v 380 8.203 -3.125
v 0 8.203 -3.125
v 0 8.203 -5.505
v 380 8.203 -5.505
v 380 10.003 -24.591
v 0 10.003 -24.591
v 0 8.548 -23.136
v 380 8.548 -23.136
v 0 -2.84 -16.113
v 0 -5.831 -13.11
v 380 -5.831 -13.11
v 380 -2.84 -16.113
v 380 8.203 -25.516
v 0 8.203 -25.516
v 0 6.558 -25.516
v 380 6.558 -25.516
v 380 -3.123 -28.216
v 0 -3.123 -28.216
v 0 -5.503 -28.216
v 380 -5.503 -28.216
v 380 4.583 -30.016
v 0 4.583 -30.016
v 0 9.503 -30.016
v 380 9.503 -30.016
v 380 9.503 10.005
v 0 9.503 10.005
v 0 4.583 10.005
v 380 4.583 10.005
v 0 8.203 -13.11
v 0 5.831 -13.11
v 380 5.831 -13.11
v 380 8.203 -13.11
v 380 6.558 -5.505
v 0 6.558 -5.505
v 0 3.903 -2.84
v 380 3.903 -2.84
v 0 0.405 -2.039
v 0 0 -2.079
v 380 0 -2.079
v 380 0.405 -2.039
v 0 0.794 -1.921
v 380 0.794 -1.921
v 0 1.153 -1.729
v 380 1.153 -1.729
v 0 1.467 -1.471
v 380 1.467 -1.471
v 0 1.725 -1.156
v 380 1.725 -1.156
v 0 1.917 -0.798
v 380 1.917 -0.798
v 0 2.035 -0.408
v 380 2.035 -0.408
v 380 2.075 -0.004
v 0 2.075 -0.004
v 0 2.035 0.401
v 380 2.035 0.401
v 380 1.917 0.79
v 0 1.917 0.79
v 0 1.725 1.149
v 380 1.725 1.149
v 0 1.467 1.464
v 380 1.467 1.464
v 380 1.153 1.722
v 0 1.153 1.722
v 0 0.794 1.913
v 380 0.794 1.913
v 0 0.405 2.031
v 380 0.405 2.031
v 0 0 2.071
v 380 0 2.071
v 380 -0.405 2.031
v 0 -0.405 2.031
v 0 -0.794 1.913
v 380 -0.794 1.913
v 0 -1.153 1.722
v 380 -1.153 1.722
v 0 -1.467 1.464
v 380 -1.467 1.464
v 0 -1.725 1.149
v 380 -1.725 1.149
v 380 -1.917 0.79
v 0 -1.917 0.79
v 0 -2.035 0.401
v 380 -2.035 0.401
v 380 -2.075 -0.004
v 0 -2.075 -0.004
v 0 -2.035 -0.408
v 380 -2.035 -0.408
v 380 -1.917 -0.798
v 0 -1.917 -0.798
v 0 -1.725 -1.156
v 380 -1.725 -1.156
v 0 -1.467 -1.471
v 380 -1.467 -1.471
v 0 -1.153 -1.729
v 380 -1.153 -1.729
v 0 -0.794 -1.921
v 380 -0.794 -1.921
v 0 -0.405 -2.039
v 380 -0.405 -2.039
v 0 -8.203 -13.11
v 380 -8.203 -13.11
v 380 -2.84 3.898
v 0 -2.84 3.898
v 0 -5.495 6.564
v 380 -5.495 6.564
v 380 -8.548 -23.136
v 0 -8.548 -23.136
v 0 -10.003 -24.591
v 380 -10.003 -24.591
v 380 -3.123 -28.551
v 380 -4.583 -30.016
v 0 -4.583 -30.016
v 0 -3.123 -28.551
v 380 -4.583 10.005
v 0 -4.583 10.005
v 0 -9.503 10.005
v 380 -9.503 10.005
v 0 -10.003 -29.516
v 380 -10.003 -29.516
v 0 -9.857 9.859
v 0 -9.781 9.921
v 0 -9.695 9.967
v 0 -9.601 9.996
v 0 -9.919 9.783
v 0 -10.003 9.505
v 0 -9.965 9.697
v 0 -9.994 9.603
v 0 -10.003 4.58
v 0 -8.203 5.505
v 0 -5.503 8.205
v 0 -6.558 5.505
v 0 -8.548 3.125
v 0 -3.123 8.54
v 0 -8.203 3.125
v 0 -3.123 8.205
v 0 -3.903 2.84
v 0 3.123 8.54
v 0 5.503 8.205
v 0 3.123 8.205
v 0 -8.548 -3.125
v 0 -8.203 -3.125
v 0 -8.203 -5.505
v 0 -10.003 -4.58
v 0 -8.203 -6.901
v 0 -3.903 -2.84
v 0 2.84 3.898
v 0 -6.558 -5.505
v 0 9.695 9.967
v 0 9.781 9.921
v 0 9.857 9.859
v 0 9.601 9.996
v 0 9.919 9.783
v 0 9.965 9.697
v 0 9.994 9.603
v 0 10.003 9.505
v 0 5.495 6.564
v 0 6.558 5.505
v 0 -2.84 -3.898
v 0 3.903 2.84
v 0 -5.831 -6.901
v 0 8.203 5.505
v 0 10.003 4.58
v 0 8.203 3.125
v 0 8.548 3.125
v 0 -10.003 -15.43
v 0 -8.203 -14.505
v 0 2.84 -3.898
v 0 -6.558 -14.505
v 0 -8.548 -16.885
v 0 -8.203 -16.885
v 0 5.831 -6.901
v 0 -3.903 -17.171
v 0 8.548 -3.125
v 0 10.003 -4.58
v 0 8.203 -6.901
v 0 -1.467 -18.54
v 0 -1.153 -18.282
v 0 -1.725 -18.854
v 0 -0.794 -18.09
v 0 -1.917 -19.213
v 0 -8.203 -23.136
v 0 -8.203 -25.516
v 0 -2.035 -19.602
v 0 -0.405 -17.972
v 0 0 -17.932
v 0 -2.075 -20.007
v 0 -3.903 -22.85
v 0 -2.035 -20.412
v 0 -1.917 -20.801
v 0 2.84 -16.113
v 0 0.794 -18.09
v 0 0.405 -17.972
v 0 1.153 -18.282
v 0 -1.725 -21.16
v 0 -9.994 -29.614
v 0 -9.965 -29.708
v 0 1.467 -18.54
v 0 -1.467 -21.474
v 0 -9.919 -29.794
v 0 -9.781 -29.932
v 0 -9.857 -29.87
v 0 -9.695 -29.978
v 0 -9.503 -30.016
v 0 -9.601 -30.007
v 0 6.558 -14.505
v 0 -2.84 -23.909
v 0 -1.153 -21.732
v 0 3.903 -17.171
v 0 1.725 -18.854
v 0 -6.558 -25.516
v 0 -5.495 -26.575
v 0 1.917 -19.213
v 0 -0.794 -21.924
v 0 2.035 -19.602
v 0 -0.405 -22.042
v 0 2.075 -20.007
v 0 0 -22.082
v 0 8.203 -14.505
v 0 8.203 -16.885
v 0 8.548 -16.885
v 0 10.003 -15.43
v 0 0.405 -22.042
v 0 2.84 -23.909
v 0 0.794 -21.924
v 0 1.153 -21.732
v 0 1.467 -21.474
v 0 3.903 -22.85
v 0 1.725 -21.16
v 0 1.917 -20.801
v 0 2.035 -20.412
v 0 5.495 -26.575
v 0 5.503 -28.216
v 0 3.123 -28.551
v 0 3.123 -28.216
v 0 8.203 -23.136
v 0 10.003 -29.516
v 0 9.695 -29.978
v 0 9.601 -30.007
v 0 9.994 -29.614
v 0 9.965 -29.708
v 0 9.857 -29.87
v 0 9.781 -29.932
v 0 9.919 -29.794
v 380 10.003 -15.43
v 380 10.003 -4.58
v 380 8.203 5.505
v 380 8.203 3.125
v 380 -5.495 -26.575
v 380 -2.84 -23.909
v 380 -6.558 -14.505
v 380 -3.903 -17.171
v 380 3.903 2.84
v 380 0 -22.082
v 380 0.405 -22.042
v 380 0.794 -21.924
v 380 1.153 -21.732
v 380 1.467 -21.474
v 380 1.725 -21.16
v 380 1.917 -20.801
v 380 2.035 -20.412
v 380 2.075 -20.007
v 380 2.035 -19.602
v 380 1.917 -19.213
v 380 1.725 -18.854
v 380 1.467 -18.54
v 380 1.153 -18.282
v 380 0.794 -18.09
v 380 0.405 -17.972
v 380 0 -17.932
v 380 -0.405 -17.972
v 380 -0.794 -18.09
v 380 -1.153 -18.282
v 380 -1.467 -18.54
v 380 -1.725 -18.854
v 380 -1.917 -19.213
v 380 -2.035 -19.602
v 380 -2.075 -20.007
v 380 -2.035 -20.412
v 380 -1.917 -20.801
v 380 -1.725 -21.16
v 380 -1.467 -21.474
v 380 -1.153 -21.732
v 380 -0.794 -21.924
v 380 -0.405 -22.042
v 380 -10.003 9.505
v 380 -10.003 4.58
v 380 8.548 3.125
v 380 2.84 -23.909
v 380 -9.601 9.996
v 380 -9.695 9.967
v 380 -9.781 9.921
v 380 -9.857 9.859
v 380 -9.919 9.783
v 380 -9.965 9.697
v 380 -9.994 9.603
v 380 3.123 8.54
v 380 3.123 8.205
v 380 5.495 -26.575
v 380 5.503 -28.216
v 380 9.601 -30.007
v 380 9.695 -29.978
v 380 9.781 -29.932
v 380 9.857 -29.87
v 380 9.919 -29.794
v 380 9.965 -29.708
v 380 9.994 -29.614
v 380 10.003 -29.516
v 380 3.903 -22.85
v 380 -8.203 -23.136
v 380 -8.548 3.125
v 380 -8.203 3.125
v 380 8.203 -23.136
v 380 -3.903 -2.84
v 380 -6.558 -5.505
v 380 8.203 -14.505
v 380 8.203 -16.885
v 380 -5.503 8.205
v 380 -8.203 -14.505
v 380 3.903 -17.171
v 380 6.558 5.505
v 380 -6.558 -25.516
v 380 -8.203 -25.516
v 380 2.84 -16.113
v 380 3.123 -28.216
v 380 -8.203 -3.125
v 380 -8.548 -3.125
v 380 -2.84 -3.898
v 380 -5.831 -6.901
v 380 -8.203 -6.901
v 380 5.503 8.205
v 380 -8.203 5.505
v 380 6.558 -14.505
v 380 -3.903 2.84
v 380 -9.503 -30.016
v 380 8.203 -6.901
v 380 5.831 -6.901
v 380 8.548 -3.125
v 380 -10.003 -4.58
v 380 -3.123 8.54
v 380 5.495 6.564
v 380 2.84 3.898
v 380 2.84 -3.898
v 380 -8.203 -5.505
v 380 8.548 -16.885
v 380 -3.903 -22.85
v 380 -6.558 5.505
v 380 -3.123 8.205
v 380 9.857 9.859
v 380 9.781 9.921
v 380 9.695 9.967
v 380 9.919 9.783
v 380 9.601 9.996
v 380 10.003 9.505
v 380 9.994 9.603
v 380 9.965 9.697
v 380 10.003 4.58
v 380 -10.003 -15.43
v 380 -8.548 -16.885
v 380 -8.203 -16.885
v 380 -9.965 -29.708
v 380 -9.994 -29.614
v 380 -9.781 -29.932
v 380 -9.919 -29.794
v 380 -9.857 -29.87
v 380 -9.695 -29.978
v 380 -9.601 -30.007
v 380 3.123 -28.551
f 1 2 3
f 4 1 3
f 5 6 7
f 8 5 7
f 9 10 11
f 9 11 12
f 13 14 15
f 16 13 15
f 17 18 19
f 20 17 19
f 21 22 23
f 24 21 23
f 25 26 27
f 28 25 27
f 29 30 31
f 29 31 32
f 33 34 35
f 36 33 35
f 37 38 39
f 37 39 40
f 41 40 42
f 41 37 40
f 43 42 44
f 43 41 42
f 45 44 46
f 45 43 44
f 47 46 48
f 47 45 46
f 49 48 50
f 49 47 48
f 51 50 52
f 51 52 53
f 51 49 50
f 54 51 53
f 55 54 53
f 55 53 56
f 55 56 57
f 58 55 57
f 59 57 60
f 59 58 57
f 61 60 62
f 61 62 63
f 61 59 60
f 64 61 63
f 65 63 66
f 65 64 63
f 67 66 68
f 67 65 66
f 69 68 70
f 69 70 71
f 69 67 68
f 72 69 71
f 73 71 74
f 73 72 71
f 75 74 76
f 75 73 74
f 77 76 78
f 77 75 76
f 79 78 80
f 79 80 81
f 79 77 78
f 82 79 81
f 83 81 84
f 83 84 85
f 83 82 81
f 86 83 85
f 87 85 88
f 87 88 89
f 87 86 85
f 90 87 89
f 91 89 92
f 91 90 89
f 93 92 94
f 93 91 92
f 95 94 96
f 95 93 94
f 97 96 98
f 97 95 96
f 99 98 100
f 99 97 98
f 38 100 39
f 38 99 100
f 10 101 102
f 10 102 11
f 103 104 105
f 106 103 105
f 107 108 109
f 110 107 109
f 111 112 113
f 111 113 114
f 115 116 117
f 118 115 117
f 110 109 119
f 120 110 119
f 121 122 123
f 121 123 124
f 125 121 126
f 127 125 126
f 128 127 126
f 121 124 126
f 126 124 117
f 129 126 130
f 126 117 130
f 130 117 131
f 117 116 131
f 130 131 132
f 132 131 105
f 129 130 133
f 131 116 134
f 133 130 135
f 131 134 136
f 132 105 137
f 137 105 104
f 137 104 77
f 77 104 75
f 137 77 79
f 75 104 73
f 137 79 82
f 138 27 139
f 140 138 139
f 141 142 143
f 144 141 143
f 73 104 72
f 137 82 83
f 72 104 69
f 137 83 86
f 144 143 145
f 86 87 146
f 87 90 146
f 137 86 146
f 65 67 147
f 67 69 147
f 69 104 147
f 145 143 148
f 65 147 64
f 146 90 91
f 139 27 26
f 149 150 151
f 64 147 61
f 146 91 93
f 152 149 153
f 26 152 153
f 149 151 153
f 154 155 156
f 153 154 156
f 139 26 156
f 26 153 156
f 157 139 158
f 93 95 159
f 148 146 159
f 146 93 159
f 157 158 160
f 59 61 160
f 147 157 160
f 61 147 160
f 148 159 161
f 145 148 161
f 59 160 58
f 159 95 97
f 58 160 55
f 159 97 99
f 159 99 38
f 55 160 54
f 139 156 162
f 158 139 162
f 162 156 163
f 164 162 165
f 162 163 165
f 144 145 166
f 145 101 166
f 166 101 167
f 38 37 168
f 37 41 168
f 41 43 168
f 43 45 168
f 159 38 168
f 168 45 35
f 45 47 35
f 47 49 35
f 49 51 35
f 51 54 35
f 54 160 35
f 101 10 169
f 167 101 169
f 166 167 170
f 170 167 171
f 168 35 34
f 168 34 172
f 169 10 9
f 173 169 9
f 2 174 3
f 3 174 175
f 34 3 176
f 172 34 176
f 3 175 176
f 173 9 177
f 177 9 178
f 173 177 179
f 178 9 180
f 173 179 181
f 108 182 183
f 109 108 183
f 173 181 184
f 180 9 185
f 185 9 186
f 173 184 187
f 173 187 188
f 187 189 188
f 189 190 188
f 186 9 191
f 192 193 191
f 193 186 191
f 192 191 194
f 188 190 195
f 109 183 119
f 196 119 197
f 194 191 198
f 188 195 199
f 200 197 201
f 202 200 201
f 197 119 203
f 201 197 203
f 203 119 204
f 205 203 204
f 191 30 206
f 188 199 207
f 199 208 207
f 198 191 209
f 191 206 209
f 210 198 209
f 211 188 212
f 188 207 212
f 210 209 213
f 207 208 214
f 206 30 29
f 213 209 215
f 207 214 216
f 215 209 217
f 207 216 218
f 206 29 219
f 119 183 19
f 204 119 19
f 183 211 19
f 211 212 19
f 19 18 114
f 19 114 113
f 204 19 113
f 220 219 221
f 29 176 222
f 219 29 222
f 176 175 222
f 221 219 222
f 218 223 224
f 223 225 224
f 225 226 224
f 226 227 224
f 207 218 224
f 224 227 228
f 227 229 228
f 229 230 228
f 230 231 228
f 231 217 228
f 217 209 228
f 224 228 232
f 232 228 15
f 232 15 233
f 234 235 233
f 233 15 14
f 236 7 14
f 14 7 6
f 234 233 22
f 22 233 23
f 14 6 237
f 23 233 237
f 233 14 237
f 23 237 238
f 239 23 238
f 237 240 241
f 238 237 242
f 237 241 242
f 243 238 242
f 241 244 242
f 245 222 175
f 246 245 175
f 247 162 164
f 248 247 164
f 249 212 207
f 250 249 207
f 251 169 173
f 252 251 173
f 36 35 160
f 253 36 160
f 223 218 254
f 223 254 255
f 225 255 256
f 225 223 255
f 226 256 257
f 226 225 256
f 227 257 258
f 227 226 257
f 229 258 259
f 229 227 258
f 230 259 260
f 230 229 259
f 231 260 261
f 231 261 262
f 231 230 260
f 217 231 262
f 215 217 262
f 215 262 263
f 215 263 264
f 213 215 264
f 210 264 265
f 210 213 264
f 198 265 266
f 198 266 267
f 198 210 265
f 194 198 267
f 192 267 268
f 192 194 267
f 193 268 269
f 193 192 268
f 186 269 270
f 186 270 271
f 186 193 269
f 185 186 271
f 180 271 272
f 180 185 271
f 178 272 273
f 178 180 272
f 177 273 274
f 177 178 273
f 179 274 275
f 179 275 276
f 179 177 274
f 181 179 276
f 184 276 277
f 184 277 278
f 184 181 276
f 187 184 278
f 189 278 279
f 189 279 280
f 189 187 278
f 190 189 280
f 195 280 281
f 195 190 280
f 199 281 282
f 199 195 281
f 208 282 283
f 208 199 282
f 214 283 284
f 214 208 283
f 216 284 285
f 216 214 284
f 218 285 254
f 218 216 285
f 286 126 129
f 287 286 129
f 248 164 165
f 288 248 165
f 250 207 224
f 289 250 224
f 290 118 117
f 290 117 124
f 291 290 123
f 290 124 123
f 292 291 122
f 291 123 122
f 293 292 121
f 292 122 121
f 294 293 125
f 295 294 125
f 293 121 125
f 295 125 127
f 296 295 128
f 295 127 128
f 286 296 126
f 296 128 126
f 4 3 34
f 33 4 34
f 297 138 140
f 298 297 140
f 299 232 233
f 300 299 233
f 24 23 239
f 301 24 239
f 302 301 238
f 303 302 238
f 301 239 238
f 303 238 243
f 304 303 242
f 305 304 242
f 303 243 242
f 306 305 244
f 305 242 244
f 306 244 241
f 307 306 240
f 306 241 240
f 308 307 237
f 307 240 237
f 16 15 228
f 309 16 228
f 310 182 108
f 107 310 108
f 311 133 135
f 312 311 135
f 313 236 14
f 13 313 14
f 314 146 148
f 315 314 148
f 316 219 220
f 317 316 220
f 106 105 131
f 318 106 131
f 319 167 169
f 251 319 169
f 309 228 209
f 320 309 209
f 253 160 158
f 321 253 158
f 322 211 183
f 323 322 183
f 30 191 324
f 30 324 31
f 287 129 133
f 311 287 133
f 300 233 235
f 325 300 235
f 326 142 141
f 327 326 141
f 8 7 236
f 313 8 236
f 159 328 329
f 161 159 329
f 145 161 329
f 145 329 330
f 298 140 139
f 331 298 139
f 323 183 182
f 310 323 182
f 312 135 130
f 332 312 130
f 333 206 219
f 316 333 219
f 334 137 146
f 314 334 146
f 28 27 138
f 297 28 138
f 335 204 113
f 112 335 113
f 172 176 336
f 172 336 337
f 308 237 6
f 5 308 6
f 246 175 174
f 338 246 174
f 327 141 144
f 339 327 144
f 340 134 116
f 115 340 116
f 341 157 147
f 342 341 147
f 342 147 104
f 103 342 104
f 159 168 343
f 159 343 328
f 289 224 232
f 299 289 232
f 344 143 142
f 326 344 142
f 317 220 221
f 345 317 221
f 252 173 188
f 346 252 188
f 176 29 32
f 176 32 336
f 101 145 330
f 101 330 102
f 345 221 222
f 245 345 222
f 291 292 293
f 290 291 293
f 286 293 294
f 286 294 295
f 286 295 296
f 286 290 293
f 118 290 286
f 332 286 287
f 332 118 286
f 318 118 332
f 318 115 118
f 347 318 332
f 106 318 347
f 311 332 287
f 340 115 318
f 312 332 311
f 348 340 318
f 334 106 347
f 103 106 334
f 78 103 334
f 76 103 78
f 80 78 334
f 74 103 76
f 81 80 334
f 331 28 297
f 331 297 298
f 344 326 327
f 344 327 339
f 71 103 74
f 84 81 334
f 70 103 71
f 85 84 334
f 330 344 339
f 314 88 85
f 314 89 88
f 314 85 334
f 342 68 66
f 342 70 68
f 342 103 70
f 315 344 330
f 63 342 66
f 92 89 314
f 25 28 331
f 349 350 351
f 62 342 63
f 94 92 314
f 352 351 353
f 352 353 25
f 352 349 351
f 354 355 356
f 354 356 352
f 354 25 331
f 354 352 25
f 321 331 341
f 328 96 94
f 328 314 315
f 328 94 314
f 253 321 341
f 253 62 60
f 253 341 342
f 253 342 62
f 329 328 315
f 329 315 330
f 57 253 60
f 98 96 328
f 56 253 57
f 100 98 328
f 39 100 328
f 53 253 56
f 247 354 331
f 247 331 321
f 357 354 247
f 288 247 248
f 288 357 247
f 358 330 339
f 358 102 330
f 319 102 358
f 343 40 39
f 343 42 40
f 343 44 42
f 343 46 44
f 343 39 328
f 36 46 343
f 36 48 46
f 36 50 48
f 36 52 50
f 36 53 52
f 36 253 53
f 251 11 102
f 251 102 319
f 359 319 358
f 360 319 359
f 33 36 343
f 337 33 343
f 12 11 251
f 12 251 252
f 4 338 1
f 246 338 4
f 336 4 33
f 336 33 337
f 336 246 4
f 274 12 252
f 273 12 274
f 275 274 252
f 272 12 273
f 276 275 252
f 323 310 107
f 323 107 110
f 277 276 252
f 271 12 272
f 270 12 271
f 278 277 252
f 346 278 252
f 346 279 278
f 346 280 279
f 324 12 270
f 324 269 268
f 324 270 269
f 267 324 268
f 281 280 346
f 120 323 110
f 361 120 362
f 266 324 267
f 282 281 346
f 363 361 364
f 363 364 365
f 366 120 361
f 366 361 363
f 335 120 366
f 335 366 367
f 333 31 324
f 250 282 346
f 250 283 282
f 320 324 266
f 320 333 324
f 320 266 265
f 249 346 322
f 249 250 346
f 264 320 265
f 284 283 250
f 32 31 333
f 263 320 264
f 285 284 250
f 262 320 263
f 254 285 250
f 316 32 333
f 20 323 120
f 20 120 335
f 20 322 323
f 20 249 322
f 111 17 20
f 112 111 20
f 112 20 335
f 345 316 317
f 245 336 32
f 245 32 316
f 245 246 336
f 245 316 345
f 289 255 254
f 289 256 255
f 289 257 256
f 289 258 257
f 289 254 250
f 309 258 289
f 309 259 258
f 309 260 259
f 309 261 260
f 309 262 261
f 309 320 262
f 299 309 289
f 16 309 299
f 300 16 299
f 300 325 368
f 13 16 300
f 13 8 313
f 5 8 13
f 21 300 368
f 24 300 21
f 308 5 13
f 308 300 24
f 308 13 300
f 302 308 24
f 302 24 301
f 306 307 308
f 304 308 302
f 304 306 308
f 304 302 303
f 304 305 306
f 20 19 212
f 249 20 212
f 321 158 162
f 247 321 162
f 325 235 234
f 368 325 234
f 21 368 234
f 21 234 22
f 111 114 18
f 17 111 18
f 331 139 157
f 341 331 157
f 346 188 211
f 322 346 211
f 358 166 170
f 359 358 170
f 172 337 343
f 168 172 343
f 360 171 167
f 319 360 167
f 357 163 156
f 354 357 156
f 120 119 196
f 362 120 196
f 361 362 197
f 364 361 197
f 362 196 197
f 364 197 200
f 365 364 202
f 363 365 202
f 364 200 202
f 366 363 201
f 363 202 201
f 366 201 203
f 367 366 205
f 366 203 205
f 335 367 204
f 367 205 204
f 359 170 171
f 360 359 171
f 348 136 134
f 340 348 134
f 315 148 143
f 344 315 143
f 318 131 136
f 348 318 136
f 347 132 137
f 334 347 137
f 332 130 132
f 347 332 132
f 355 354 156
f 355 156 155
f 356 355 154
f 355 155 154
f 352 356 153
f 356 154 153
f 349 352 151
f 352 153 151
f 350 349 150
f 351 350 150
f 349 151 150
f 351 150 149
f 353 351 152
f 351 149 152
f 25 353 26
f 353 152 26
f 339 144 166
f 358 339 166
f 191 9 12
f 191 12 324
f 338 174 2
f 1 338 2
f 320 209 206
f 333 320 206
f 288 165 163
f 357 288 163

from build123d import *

# Parameters (mm, degrees)
SKETCH2_R           = 2.075
BOSS_EXTRUDE1_DEPTH = 380


with BuildPart() as part:
    # Sketch2 → Boss-Extrude1 (new body)
    with BuildSketch(Plane(origin=(0, 0, 0), x_dir=(0, 0, -1), z_dir=(1, 0, 0))):
        with BuildLine():
            Line((3.125428693, 8.548200862), (3.125428693, 8.203200862))
            Line((3.125428693, 8.203200862), (5.505428693, 8.203200862))
            Line((5.505428693, 8.203200862), (5.505428693, 6.558200862))
            Line((5.505428693, 6.558200862), (2.839571307, 3.903200862))
            Line((2.839571307, 3.903200862), (-2.839571307, 3.903200862))
            Line((-2.839571307, 3.903200862), (-5.505428693, 6.558200862))
            Line((-5.505428693, 6.558200862), (-5.505428693, 8.203200862))
            Line((-5.505428693, 8.203200862), (-3.125428693, 8.203200862))
            Line((-3.125428693, 8.203200862), (-3.125428693, 8.548200862))
            Line((-3.125428693, 8.548200862), (-4.580428693, 10.003200862))
            Line((-4.580428693, 10.003200862), (-9.505428693, 10.003200862))
            ThreePointArc((-9.505428693, 10.003200862), (-9.858982084, 9.856754253), (-10.005428693, 9.503200862))
            Line((-10.005428693, 9.503200862), (-10.005428693, 4.583200862))
            Line((-10.005428693, 4.583200862), (-8.53985696, 3.123200862))
            Line((-8.53985696, 3.123200862), (-8.205428693, 3.123200862))
            Line((-8.205428693, 3.123200862), (-8.205428693, 5.503200862))
            Line((-8.205428693, 5.503200862), (-6.563922349, 5.49537859))
            Line((-6.563922349, 5.49537859), (-3.898064962, 2.84037859))
            Line((-3.898064962, 2.84037859), (-3.898064962, -2.84037859))
            Line((-3.898064962, -2.84037859), (-6.563922349, -5.49537859))
            Line((-6.563922349, -5.49537859), (-8.205428693, -5.503200862))
            Line((-8.205428693, -5.503200862), (-8.205428693, -3.123200862))
            Line((-8.205428693, -3.123200862), (-8.53985696, -3.123200862))
            Line((-8.53985696, -3.123200862), (-10.005428693, -4.583200862))
            Line((-10.005428693, -4.583200862), (-10.005428693, -9.503200862))
            ThreePointArc((-10.005428693, -9.503200862), (-9.858982084, -9.856754253), (-9.505428693, -10.003200862))
            Line((-9.505428693, -10.003200862), (-4.580428693, -10.003200862))
            Line((-4.580428693, -10.003200862), (-3.125428693, -8.548200862))
            Line((-3.125428693, -8.548200862), (-3.125428693, -8.203200862))
            Line((-3.125428693, -8.203200862), (-5.505428693, -8.203200862))
            Line((-5.505428693, -8.203200862), (-5.505428693, -6.558200862))
            Line((-5.505428693, -6.558200862), (-2.839571307, -3.903200862))
            Line((-2.839571307, -3.903200862), (2.839571307, -3.903200862))
            Line((2.839571307, -3.903200862), (5.505428693, -6.558200862))
            Line((5.505428693, -6.558200862), (5.505428693, -8.203200862))
            Line((5.505428693, -8.203200862), (3.125428693, -8.203200862))
            Line((3.125428693, -8.203200862), (3.125428693, -8.548200862))
            Line((3.125428693, -8.548200862), (4.580428693, -10.003200862))
            Line((4.580428693, -10.003200862), (15.430428693, -10.003200862))
            Line((15.430428693, -10.003200862), (16.885428693, -8.548200862))
            Line((16.885428693, -8.548200862), (16.885428693, -8.203200862))
            Line((16.885428693, -8.203200862), (14.505428693, -8.203200862))
            Line((14.505428693, -8.203200862), (14.505428693, -6.558200862))
            Line((14.505428693, -6.558200862), (17.17128608, -3.903200862))
            Line((17.17128608, -3.903200862), (22.850428693, -3.903200862))
            Line((22.850428693, -3.903200862), (25.51628608, -6.558200862))
            Line((25.51628608, -6.558200862), (25.51628608, -8.203200862))
            Line((25.51628608, -8.203200862), (23.13628608, -8.203200862))
            Line((23.13628608, -8.203200862), (23.13628608, -8.548200862))
            Line((23.13628608, -8.548200862), (24.59128608, -10.003200862))
            Line((24.59128608, -10.003200862), (29.51628608, -10.003200862))
            ThreePointArc((29.51628608, -10.003200862), (29.869839471, -9.856754253), (30.01628608, -9.503200862))
            Line((30.01628608, -9.503200862), (30.01628608, -4.583200862))
            Line((30.01628608, -4.583200862), (28.550714346, -3.123200862))
            Line((28.550714346, -3.123200862), (28.21628608, -3.123200862))
            Line((28.21628608, -3.123200862), (28.21628608, -5.503200862))
            Line((28.21628608, -5.503200862), (26.574779736, -5.49537859))
            Line((26.574779736, -5.49537859), (23.908922349, -2.84037859))
            Line((23.908922349, -2.84037859), (23.908922349, 2.84037859))
            Line((23.908922349, 2.84037859), (26.574779736, 5.49537859))
            Line((26.574779736, 5.49537859), (28.21628608, 5.503200862))
            Line((28.21628608, 5.503200862), (28.21628608, 3.123200862))
            Line((28.21628608, 3.123200862), (28.550714346, 3.123200862))
            Line((28.550714346, 3.123200862), (30.01628608, 4.583200862))
            Line((30.01628608, 4.583200862), (30.01628608, 9.503200862))
            ThreePointArc((30.01628608, 9.503200862), (29.869839471, 9.856754253), (29.51628608, 10.003200862))
            Line((29.51628608, 10.003200862), (24.59128608, 10.003200862))
            Line((24.59128608, 10.003200862), (23.13628608, 8.548200862))
            Line((23.13628608, 8.548200862), (23.13628608, 8.203200862))
            Line((23.13628608, 8.203200862), (25.51628608, 8.203200862))
            Line((25.51628608, 8.203200862), (25.51628608, 6.558200862))
            Line((25.51628608, 6.558200862), (22.850428693, 3.903200862))
            Line((22.850428693, 3.903200862), (17.17128608, 3.903200862))
            Line((17.17128608, 3.903200862), (14.505428693, 6.558200862))
            Line((14.505428693, 6.558200862), (14.505428693, 8.203200862))
            Line((14.505428693, 8.203200862), (16.885428693, 8.203200862))
            Line((16.885428693, 8.203200862), (16.885428693, 8.548200862))
            Line((16.885428693, 8.548200862), (15.430428693, 10.003200862))
            Line((15.430428693, 10.003200862), (4.580428693, 10.003200862))
            Line((4.580428693, 10.003200862), (3.125428693, 8.548200862))
        make_face()
        with Locations((0.003681866, 0)):
            Circle(SKETCH2_R, mode=Mode.SUBTRACT)
        with Locations((20.007175521, 0)):
            Circle(SKETCH2_R, mode=Mode.SUBTRACT)
        Polygon((3.898064962, 2.84037859), (3.898064962, -2.84037859), (6.90134296, -5.83142497), (6.90134296, -8.203200862), (13.109514426, -8.203200862), (13.109514426, -5.83142497), (16.112792425, -2.84037859), (16.112792425, 2.84037859), (13.109514426, 5.83142497), (13.109514426, 8.203200862), (6.90134296, 8.203200862), (6.90134296, 5.83142497), align=None, mode=Mode.SUBTRACT)
    extrude(amount=BOSS_EXTRUDE1_DEPTH)


solid = part.part
